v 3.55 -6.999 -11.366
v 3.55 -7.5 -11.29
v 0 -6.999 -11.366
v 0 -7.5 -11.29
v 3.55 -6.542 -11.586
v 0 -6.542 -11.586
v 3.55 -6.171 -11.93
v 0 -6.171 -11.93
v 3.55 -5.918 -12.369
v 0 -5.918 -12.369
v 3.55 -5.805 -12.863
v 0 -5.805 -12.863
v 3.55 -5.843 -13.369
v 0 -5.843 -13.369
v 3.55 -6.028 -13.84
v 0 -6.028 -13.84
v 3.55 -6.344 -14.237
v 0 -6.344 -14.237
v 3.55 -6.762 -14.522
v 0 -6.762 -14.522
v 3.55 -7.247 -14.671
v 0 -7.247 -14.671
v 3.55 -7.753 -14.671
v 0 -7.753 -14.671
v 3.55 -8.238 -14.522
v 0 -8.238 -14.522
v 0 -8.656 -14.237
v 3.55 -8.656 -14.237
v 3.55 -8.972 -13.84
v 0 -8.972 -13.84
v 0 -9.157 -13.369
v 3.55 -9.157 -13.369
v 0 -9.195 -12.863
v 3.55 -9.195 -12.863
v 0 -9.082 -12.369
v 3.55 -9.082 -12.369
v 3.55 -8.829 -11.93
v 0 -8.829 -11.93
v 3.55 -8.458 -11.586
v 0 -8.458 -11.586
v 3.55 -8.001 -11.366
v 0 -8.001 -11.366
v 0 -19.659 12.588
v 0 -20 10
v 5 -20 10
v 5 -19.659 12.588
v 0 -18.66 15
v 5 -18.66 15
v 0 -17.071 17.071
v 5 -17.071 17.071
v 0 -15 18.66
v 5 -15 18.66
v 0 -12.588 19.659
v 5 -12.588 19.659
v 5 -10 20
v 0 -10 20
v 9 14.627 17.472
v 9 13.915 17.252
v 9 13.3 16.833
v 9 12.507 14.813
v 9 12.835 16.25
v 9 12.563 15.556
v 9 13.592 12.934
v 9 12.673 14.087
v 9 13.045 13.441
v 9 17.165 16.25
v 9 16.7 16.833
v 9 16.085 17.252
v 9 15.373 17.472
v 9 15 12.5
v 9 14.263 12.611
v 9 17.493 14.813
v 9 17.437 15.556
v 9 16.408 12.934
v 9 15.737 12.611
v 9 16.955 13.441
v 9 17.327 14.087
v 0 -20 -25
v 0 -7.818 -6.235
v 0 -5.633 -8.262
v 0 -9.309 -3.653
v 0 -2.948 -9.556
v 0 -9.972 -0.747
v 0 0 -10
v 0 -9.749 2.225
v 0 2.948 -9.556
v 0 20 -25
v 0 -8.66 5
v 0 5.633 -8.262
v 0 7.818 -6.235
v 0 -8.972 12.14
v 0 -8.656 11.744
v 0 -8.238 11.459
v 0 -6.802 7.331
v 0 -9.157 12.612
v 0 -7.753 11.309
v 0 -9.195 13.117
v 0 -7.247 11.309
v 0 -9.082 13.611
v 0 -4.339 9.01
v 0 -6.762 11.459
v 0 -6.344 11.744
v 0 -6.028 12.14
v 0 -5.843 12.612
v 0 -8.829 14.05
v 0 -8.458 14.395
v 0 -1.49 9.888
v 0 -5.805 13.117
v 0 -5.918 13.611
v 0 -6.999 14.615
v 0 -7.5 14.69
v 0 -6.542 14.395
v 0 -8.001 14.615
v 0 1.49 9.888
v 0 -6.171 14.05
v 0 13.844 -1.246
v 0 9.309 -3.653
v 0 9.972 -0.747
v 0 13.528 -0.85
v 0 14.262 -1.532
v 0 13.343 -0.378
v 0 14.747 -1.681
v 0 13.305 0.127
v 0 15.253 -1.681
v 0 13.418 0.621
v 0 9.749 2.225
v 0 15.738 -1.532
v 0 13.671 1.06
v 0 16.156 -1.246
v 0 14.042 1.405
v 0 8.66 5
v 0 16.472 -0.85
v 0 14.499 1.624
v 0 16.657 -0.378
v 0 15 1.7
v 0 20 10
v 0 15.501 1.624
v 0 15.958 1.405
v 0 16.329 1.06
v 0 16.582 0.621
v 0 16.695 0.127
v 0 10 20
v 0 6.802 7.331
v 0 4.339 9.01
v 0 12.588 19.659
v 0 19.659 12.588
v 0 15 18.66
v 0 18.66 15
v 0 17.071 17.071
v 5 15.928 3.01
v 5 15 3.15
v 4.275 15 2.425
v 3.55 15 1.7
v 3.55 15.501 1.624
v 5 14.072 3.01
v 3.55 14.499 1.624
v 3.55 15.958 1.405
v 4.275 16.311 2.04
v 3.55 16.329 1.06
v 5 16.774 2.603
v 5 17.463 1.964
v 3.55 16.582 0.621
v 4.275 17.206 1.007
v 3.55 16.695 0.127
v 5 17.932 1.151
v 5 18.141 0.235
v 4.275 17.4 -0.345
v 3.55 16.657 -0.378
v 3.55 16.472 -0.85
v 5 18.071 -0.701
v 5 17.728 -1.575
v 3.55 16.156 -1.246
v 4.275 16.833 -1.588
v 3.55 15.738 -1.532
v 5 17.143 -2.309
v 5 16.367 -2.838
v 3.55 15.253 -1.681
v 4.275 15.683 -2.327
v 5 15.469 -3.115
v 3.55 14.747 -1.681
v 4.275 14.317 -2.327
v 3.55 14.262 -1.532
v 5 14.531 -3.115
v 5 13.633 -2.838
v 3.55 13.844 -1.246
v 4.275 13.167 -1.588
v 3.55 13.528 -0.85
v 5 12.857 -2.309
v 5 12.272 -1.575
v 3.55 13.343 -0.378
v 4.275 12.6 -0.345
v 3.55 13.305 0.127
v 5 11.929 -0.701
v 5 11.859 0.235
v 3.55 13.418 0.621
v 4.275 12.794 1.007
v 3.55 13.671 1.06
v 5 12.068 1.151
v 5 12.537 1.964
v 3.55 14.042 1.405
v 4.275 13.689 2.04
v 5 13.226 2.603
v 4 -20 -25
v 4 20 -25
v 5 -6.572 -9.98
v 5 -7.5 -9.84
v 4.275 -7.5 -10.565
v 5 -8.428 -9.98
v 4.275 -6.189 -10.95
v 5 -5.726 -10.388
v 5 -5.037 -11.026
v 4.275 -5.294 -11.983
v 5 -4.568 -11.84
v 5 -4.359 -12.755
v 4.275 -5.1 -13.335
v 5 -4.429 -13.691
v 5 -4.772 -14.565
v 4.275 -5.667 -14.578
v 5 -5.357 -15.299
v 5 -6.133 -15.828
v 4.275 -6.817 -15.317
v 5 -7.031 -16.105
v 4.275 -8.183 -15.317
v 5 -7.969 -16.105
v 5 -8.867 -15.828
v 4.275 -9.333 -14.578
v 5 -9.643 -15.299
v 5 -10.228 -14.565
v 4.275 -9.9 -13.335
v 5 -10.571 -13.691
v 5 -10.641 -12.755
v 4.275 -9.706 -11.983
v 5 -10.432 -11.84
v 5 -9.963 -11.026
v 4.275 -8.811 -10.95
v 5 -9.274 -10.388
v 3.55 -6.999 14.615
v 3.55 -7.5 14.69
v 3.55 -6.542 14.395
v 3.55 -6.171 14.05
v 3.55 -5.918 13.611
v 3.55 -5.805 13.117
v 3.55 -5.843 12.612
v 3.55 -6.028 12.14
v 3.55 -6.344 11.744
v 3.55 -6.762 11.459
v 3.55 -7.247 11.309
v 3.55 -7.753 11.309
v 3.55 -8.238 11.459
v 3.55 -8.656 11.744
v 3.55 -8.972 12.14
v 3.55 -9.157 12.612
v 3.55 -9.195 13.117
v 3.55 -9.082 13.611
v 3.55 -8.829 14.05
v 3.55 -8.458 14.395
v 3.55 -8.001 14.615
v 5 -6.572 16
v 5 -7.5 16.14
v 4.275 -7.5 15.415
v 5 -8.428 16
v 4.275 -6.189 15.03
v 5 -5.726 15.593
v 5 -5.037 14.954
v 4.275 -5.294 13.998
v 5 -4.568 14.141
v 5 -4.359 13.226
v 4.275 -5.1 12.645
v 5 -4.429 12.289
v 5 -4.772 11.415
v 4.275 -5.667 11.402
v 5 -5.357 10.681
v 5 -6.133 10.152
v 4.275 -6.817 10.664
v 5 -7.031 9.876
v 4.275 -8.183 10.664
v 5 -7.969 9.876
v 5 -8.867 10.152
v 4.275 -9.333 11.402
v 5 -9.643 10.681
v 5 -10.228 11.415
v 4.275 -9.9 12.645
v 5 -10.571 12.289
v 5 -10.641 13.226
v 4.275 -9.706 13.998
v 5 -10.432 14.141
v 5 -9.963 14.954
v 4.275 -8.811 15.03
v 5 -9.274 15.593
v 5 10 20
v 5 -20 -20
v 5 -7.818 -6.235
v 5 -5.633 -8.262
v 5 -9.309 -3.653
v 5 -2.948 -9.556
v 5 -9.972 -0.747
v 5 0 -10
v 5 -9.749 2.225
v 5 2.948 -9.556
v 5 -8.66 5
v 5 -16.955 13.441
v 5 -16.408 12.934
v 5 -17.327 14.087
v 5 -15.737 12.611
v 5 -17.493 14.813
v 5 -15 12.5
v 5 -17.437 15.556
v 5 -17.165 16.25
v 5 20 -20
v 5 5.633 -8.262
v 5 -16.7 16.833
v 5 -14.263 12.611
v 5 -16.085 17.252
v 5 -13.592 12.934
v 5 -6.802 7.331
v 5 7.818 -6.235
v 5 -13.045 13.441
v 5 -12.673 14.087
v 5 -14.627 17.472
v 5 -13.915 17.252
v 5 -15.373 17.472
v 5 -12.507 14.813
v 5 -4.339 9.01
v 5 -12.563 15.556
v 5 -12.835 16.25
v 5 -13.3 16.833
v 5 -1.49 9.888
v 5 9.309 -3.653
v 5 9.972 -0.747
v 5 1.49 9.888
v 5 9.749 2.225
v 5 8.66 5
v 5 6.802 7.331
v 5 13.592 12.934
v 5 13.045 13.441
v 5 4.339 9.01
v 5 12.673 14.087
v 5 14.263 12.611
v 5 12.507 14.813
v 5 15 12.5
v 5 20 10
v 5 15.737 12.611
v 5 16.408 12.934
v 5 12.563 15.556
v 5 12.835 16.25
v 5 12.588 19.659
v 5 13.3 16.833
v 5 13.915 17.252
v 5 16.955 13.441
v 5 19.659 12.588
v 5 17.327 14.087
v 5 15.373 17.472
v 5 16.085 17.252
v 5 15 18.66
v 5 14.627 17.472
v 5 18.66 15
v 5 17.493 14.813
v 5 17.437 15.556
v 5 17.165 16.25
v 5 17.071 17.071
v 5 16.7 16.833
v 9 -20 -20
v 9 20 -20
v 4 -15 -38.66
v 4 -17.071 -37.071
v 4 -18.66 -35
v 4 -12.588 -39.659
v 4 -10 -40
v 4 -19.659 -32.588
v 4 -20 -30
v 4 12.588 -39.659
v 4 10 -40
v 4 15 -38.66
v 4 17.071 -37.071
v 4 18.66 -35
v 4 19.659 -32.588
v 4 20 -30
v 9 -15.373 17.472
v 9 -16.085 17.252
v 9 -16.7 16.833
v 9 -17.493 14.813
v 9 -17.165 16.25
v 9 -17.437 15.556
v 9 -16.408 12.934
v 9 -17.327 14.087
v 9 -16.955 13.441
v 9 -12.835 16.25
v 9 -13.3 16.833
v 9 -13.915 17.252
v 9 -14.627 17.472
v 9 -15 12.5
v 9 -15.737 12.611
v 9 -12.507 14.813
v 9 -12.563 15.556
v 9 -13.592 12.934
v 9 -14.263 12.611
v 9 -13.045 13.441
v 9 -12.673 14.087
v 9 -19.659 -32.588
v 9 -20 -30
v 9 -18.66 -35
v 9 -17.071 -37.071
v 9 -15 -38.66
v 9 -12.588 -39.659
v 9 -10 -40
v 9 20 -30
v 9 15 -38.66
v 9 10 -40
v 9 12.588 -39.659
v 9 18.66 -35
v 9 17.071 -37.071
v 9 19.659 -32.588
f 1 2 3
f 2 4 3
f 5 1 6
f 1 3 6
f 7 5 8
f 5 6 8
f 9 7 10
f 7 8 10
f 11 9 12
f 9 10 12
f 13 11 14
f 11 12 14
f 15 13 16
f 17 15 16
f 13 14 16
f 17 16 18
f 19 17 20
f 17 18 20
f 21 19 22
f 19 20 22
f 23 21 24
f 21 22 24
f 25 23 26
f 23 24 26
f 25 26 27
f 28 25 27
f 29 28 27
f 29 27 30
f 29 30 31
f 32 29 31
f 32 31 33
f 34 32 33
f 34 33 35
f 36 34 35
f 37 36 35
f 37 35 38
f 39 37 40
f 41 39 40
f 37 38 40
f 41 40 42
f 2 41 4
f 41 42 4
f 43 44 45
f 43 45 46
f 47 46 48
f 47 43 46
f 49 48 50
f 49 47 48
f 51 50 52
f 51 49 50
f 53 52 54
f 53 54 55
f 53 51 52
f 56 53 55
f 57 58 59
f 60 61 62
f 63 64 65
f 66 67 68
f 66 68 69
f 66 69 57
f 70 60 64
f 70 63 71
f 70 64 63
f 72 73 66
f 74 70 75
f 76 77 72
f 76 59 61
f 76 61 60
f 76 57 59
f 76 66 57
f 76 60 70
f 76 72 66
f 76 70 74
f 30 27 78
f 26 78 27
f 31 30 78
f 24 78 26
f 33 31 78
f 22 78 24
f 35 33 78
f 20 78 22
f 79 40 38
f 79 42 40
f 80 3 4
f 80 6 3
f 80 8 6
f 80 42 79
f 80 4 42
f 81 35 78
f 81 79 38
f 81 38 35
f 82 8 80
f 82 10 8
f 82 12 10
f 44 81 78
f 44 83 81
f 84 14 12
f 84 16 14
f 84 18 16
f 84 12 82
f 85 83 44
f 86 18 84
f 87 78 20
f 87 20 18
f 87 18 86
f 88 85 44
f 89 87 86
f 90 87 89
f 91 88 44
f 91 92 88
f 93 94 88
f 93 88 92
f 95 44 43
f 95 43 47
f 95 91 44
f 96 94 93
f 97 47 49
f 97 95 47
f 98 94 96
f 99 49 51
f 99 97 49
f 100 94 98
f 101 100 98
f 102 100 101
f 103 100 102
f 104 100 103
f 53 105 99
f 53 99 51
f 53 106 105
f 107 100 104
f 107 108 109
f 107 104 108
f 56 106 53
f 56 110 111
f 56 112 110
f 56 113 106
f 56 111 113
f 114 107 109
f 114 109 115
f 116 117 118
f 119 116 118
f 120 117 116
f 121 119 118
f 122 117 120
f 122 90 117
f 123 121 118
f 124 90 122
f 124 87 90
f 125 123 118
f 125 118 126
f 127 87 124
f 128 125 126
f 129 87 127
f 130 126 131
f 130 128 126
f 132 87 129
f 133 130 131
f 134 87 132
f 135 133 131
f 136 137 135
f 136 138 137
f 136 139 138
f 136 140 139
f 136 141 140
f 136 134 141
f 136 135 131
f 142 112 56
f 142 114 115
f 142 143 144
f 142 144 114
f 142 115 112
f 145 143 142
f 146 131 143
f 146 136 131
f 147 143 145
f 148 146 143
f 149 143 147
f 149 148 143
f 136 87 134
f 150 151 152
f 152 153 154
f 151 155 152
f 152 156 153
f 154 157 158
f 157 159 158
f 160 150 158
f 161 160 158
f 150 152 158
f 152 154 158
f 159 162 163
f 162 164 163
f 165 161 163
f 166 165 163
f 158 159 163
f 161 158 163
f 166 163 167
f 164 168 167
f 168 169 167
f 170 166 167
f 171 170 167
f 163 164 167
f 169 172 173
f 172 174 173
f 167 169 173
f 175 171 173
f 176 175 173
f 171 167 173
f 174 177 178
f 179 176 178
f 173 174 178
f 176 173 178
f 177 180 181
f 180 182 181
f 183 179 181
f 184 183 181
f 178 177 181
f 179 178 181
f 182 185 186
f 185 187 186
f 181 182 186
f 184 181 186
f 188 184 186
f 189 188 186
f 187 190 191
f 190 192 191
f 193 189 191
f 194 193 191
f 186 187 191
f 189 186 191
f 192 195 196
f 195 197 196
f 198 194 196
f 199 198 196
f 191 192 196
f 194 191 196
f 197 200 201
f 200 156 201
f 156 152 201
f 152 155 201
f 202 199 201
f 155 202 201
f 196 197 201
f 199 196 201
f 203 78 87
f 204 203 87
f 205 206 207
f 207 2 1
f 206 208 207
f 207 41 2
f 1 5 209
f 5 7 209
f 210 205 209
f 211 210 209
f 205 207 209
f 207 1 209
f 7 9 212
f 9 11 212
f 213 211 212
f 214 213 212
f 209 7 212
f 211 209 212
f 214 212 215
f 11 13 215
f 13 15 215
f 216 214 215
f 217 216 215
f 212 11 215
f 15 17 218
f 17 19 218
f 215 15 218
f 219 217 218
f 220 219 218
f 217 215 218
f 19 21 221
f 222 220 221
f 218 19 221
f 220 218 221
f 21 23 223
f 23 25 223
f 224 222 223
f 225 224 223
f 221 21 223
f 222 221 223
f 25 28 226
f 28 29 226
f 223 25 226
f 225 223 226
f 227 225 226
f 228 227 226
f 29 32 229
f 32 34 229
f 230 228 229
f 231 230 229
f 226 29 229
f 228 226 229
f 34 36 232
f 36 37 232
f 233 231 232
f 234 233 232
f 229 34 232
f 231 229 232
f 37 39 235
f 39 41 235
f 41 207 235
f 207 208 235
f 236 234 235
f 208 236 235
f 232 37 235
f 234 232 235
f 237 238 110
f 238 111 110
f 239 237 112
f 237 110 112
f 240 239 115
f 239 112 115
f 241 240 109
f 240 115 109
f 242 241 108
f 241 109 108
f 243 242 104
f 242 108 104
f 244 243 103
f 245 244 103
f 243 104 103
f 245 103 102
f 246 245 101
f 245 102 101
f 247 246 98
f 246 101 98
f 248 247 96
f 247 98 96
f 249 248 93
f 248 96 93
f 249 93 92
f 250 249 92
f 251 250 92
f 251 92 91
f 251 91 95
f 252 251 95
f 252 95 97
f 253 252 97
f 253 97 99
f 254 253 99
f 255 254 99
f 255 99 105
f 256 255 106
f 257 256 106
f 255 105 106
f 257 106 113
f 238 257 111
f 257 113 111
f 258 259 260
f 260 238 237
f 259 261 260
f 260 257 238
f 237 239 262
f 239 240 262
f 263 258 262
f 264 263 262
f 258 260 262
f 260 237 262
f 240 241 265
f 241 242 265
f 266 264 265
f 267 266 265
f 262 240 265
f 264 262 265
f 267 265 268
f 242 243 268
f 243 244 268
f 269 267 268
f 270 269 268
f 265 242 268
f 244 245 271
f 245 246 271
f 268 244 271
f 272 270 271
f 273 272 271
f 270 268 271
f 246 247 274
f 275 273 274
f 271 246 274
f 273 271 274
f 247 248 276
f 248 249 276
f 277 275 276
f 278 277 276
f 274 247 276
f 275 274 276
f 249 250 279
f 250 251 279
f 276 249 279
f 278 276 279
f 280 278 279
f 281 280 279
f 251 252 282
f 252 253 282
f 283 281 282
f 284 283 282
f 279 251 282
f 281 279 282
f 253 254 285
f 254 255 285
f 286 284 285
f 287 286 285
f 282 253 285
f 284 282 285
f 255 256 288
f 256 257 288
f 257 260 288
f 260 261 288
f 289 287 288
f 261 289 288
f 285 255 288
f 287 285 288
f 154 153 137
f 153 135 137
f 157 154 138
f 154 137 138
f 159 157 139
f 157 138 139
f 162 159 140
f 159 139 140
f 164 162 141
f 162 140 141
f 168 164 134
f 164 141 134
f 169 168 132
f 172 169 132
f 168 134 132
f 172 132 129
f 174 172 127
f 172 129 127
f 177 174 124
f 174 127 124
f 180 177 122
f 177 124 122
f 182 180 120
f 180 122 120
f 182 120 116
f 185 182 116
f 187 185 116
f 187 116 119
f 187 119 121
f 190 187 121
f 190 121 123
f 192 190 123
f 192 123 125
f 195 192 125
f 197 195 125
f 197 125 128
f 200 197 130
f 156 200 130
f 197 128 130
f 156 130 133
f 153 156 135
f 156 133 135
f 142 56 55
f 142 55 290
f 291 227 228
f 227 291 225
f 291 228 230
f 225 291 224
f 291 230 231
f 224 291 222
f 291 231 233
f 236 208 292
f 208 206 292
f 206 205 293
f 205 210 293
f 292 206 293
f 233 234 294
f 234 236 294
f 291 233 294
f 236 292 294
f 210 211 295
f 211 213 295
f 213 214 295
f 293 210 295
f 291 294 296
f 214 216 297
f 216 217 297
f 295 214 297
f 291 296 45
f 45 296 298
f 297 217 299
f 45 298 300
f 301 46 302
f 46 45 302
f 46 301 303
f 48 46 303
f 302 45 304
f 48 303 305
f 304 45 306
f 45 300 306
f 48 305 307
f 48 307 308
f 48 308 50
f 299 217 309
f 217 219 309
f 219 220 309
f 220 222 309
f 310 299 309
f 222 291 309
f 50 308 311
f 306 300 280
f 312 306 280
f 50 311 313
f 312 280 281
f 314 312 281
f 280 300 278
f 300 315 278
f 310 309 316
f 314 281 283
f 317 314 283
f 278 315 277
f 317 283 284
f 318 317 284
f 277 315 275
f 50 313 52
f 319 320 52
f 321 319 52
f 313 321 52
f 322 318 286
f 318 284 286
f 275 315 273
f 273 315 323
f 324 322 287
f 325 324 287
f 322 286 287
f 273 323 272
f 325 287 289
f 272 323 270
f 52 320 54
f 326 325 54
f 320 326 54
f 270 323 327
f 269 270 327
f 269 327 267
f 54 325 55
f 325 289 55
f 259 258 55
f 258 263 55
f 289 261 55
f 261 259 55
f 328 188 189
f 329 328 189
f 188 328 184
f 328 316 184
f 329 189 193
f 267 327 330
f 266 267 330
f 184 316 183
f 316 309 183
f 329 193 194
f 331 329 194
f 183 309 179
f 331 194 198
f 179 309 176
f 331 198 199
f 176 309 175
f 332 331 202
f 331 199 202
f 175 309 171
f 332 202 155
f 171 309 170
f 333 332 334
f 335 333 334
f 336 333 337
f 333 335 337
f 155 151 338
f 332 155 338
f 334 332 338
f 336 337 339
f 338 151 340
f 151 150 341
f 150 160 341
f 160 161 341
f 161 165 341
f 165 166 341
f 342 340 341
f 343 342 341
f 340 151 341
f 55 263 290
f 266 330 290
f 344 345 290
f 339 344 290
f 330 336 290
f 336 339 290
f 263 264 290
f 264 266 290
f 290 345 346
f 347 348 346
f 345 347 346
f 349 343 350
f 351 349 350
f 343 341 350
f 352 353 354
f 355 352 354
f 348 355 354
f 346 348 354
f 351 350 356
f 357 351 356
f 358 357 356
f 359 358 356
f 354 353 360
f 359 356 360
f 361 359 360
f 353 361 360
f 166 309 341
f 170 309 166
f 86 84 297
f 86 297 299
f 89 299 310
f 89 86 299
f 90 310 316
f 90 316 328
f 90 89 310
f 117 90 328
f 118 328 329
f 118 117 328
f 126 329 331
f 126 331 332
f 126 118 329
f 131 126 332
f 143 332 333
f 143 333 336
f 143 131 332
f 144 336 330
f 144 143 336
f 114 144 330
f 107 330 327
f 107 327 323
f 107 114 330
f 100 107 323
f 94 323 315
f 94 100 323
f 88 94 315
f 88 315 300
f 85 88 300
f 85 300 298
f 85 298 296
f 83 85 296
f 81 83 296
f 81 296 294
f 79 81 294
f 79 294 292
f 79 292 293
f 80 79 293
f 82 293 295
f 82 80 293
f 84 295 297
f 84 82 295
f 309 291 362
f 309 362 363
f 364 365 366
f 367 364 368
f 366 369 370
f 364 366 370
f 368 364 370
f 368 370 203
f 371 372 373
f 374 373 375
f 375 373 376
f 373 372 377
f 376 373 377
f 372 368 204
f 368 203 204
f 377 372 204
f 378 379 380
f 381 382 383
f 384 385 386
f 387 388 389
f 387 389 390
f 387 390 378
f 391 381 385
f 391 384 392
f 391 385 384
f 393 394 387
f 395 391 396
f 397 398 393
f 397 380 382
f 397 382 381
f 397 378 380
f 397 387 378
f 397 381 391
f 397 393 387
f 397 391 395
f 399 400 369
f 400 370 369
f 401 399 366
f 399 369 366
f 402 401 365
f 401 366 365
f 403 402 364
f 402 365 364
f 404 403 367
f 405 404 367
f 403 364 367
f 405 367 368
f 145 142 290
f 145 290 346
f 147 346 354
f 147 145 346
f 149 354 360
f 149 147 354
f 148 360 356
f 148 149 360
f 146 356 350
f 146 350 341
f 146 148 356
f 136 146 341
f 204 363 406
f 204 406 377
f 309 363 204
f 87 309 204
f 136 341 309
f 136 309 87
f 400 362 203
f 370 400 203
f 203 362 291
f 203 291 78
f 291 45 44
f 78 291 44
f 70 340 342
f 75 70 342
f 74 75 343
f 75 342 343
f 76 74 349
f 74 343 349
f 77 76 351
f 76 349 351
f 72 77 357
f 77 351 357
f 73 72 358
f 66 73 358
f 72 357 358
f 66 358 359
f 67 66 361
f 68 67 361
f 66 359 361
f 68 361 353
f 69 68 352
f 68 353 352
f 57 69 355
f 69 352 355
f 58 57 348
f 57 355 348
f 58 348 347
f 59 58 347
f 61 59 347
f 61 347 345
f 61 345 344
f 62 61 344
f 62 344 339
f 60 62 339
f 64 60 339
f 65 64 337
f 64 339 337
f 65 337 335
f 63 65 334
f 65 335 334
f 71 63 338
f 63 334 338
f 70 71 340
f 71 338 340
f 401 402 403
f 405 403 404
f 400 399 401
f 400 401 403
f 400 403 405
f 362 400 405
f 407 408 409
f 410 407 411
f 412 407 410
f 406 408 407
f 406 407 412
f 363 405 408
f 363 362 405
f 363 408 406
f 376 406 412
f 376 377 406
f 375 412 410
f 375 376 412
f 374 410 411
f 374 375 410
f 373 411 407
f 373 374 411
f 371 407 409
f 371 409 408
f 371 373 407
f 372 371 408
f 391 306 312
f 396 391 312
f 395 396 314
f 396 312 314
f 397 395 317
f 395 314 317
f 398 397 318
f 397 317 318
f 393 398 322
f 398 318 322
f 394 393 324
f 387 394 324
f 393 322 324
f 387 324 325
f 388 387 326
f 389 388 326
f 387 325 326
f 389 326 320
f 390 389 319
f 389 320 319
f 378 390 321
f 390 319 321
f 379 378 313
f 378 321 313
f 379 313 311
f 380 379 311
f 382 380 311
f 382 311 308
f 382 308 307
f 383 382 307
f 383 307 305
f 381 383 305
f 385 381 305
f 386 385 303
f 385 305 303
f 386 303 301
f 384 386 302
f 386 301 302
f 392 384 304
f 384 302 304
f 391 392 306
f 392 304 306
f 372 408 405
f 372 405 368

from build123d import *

# Parameters (mm, degrees)
SKETCH1_R                                       = 10
BOSS_EXTRUDE1_DEPTH                             = 5
CSK_FOR_M3_FLAT_HEAD_MACHINE_SCREW1_D           = 3.4
CSK_FOR_M3_FLAT_HEAD_MACHINE_SCREW1_CSINK_D     = 6.3
CSK_FOR_M3_FLAT_HEAD_MACHINE_SCREW1_CSINK_ANGLE = 90
SKETCH4_W                                       = 5
SKETCH4_H                                       = 40
BOSS_EXTRUDE2_DEPTH                             = 9
SKETCH5_W                                       = 5
SKETCH5_H                                       = 40
BOSS_EXTRUDE3_DEPTH                             = 15
FILLET2_R                                       = 10
SKETCH6_R                                       = 2.5
BOSS_EXTRUDE4_DEPTH                             = 4


with BuildPart() as part:
    # Sketch1 → Boss-Extrude1 (new body)
    with BuildSketch(Plane(origin=(0, 0, 0), x_dir=(0, 0, -1), z_dir=(1, 0, 0))):
        with BuildLine():
            Line((10, 20), (20, 20))
            Line((20, 20), (20, 10))
            Line((20, 10), (20, -10))
            Line((20, -10), (20, -20))
            Line((20, -20), (10, -20))
            Line((10, -20), (-10, -20))
            ThreePointArc((-10, -20), (-17.071067812, -17.071067812), (-20, -10))
            Line((-20, -10), (-20, 10))
            ThreePointArc((-20, 10), (-17.071067812, 17.071067812), (-10, 20))
            Line((-10, 20), (10, 20))
        make_face()
        Circle(SKETCH1_R, mode=Mode.SUBTRACT)
    extrude(amount=BOSS_EXTRUDE1_DEPTH)

    # CSK for M3 Flat Head Machine Screw1 (through all)
    with Locations(Plane(origin=(5, 0, 0), x_dir=(0, 0, -1), z_dir=(1, 0, 0))):
        with Locations((0, 15), (12.990381057, -7.5), (-12.990381057, -7.5)):
            CounterSinkHole(CSK_FOR_M3_FLAT_HEAD_MACHINE_SCREW1_D / 2, CSK_FOR_M3_FLAT_HEAD_MACHINE_SCREW1_CSINK_D / 2, counter_sink_angle=CSK_FOR_M3_FLAT_HEAD_MACHINE_SCREW1_CSINK_ANGLE)

    # Sketch4 → Boss-Extrude2 (add)
    with BuildSketch(Plane.ZY):
        with Locations((-22.5, 0)):
            Rectangle(SKETCH4_W, SKETCH4_H)
    extrude(amount=-BOSS_EXTRUDE2_DEPTH)

    # Sketch5 → Boss-Extrude3 (add)
    with BuildSketch(Plane(origin=(0, 0, -25), x_dir=(-1, 0, 0), z_dir=(0, 0, -1))):
        with Locations((-6.5, 0)):
            Rectangle(SKETCH5_W, SKETCH5_H)
    extrude(amount=BOSS_EXTRUDE3_DEPTH)

    # Fillet2
    fillet2_edges = [part.edges().sort_by_distance(p)[0] for p in [
        (6.5, 20, -40),
        (6.5, -20, -40),
    ]]
    fillet(fillet2_edges, radius=FILLET2_R)

    # Sketch6 → Boss-Extrude4 (add)
    with BuildSketch(Plane(origin=(5, 0, 0), x_dir=(0, 0, -1), z_dir=(1, 0, 0))):
        with Locations((-15, -15)):
            Circle(SKETCH6_R)
        with Locations((-15, 15)):
            Circle(SKETCH6_R)
    extrude(amount=BOSS_EXTRUDE4_DEPTH)


solid = part.part
